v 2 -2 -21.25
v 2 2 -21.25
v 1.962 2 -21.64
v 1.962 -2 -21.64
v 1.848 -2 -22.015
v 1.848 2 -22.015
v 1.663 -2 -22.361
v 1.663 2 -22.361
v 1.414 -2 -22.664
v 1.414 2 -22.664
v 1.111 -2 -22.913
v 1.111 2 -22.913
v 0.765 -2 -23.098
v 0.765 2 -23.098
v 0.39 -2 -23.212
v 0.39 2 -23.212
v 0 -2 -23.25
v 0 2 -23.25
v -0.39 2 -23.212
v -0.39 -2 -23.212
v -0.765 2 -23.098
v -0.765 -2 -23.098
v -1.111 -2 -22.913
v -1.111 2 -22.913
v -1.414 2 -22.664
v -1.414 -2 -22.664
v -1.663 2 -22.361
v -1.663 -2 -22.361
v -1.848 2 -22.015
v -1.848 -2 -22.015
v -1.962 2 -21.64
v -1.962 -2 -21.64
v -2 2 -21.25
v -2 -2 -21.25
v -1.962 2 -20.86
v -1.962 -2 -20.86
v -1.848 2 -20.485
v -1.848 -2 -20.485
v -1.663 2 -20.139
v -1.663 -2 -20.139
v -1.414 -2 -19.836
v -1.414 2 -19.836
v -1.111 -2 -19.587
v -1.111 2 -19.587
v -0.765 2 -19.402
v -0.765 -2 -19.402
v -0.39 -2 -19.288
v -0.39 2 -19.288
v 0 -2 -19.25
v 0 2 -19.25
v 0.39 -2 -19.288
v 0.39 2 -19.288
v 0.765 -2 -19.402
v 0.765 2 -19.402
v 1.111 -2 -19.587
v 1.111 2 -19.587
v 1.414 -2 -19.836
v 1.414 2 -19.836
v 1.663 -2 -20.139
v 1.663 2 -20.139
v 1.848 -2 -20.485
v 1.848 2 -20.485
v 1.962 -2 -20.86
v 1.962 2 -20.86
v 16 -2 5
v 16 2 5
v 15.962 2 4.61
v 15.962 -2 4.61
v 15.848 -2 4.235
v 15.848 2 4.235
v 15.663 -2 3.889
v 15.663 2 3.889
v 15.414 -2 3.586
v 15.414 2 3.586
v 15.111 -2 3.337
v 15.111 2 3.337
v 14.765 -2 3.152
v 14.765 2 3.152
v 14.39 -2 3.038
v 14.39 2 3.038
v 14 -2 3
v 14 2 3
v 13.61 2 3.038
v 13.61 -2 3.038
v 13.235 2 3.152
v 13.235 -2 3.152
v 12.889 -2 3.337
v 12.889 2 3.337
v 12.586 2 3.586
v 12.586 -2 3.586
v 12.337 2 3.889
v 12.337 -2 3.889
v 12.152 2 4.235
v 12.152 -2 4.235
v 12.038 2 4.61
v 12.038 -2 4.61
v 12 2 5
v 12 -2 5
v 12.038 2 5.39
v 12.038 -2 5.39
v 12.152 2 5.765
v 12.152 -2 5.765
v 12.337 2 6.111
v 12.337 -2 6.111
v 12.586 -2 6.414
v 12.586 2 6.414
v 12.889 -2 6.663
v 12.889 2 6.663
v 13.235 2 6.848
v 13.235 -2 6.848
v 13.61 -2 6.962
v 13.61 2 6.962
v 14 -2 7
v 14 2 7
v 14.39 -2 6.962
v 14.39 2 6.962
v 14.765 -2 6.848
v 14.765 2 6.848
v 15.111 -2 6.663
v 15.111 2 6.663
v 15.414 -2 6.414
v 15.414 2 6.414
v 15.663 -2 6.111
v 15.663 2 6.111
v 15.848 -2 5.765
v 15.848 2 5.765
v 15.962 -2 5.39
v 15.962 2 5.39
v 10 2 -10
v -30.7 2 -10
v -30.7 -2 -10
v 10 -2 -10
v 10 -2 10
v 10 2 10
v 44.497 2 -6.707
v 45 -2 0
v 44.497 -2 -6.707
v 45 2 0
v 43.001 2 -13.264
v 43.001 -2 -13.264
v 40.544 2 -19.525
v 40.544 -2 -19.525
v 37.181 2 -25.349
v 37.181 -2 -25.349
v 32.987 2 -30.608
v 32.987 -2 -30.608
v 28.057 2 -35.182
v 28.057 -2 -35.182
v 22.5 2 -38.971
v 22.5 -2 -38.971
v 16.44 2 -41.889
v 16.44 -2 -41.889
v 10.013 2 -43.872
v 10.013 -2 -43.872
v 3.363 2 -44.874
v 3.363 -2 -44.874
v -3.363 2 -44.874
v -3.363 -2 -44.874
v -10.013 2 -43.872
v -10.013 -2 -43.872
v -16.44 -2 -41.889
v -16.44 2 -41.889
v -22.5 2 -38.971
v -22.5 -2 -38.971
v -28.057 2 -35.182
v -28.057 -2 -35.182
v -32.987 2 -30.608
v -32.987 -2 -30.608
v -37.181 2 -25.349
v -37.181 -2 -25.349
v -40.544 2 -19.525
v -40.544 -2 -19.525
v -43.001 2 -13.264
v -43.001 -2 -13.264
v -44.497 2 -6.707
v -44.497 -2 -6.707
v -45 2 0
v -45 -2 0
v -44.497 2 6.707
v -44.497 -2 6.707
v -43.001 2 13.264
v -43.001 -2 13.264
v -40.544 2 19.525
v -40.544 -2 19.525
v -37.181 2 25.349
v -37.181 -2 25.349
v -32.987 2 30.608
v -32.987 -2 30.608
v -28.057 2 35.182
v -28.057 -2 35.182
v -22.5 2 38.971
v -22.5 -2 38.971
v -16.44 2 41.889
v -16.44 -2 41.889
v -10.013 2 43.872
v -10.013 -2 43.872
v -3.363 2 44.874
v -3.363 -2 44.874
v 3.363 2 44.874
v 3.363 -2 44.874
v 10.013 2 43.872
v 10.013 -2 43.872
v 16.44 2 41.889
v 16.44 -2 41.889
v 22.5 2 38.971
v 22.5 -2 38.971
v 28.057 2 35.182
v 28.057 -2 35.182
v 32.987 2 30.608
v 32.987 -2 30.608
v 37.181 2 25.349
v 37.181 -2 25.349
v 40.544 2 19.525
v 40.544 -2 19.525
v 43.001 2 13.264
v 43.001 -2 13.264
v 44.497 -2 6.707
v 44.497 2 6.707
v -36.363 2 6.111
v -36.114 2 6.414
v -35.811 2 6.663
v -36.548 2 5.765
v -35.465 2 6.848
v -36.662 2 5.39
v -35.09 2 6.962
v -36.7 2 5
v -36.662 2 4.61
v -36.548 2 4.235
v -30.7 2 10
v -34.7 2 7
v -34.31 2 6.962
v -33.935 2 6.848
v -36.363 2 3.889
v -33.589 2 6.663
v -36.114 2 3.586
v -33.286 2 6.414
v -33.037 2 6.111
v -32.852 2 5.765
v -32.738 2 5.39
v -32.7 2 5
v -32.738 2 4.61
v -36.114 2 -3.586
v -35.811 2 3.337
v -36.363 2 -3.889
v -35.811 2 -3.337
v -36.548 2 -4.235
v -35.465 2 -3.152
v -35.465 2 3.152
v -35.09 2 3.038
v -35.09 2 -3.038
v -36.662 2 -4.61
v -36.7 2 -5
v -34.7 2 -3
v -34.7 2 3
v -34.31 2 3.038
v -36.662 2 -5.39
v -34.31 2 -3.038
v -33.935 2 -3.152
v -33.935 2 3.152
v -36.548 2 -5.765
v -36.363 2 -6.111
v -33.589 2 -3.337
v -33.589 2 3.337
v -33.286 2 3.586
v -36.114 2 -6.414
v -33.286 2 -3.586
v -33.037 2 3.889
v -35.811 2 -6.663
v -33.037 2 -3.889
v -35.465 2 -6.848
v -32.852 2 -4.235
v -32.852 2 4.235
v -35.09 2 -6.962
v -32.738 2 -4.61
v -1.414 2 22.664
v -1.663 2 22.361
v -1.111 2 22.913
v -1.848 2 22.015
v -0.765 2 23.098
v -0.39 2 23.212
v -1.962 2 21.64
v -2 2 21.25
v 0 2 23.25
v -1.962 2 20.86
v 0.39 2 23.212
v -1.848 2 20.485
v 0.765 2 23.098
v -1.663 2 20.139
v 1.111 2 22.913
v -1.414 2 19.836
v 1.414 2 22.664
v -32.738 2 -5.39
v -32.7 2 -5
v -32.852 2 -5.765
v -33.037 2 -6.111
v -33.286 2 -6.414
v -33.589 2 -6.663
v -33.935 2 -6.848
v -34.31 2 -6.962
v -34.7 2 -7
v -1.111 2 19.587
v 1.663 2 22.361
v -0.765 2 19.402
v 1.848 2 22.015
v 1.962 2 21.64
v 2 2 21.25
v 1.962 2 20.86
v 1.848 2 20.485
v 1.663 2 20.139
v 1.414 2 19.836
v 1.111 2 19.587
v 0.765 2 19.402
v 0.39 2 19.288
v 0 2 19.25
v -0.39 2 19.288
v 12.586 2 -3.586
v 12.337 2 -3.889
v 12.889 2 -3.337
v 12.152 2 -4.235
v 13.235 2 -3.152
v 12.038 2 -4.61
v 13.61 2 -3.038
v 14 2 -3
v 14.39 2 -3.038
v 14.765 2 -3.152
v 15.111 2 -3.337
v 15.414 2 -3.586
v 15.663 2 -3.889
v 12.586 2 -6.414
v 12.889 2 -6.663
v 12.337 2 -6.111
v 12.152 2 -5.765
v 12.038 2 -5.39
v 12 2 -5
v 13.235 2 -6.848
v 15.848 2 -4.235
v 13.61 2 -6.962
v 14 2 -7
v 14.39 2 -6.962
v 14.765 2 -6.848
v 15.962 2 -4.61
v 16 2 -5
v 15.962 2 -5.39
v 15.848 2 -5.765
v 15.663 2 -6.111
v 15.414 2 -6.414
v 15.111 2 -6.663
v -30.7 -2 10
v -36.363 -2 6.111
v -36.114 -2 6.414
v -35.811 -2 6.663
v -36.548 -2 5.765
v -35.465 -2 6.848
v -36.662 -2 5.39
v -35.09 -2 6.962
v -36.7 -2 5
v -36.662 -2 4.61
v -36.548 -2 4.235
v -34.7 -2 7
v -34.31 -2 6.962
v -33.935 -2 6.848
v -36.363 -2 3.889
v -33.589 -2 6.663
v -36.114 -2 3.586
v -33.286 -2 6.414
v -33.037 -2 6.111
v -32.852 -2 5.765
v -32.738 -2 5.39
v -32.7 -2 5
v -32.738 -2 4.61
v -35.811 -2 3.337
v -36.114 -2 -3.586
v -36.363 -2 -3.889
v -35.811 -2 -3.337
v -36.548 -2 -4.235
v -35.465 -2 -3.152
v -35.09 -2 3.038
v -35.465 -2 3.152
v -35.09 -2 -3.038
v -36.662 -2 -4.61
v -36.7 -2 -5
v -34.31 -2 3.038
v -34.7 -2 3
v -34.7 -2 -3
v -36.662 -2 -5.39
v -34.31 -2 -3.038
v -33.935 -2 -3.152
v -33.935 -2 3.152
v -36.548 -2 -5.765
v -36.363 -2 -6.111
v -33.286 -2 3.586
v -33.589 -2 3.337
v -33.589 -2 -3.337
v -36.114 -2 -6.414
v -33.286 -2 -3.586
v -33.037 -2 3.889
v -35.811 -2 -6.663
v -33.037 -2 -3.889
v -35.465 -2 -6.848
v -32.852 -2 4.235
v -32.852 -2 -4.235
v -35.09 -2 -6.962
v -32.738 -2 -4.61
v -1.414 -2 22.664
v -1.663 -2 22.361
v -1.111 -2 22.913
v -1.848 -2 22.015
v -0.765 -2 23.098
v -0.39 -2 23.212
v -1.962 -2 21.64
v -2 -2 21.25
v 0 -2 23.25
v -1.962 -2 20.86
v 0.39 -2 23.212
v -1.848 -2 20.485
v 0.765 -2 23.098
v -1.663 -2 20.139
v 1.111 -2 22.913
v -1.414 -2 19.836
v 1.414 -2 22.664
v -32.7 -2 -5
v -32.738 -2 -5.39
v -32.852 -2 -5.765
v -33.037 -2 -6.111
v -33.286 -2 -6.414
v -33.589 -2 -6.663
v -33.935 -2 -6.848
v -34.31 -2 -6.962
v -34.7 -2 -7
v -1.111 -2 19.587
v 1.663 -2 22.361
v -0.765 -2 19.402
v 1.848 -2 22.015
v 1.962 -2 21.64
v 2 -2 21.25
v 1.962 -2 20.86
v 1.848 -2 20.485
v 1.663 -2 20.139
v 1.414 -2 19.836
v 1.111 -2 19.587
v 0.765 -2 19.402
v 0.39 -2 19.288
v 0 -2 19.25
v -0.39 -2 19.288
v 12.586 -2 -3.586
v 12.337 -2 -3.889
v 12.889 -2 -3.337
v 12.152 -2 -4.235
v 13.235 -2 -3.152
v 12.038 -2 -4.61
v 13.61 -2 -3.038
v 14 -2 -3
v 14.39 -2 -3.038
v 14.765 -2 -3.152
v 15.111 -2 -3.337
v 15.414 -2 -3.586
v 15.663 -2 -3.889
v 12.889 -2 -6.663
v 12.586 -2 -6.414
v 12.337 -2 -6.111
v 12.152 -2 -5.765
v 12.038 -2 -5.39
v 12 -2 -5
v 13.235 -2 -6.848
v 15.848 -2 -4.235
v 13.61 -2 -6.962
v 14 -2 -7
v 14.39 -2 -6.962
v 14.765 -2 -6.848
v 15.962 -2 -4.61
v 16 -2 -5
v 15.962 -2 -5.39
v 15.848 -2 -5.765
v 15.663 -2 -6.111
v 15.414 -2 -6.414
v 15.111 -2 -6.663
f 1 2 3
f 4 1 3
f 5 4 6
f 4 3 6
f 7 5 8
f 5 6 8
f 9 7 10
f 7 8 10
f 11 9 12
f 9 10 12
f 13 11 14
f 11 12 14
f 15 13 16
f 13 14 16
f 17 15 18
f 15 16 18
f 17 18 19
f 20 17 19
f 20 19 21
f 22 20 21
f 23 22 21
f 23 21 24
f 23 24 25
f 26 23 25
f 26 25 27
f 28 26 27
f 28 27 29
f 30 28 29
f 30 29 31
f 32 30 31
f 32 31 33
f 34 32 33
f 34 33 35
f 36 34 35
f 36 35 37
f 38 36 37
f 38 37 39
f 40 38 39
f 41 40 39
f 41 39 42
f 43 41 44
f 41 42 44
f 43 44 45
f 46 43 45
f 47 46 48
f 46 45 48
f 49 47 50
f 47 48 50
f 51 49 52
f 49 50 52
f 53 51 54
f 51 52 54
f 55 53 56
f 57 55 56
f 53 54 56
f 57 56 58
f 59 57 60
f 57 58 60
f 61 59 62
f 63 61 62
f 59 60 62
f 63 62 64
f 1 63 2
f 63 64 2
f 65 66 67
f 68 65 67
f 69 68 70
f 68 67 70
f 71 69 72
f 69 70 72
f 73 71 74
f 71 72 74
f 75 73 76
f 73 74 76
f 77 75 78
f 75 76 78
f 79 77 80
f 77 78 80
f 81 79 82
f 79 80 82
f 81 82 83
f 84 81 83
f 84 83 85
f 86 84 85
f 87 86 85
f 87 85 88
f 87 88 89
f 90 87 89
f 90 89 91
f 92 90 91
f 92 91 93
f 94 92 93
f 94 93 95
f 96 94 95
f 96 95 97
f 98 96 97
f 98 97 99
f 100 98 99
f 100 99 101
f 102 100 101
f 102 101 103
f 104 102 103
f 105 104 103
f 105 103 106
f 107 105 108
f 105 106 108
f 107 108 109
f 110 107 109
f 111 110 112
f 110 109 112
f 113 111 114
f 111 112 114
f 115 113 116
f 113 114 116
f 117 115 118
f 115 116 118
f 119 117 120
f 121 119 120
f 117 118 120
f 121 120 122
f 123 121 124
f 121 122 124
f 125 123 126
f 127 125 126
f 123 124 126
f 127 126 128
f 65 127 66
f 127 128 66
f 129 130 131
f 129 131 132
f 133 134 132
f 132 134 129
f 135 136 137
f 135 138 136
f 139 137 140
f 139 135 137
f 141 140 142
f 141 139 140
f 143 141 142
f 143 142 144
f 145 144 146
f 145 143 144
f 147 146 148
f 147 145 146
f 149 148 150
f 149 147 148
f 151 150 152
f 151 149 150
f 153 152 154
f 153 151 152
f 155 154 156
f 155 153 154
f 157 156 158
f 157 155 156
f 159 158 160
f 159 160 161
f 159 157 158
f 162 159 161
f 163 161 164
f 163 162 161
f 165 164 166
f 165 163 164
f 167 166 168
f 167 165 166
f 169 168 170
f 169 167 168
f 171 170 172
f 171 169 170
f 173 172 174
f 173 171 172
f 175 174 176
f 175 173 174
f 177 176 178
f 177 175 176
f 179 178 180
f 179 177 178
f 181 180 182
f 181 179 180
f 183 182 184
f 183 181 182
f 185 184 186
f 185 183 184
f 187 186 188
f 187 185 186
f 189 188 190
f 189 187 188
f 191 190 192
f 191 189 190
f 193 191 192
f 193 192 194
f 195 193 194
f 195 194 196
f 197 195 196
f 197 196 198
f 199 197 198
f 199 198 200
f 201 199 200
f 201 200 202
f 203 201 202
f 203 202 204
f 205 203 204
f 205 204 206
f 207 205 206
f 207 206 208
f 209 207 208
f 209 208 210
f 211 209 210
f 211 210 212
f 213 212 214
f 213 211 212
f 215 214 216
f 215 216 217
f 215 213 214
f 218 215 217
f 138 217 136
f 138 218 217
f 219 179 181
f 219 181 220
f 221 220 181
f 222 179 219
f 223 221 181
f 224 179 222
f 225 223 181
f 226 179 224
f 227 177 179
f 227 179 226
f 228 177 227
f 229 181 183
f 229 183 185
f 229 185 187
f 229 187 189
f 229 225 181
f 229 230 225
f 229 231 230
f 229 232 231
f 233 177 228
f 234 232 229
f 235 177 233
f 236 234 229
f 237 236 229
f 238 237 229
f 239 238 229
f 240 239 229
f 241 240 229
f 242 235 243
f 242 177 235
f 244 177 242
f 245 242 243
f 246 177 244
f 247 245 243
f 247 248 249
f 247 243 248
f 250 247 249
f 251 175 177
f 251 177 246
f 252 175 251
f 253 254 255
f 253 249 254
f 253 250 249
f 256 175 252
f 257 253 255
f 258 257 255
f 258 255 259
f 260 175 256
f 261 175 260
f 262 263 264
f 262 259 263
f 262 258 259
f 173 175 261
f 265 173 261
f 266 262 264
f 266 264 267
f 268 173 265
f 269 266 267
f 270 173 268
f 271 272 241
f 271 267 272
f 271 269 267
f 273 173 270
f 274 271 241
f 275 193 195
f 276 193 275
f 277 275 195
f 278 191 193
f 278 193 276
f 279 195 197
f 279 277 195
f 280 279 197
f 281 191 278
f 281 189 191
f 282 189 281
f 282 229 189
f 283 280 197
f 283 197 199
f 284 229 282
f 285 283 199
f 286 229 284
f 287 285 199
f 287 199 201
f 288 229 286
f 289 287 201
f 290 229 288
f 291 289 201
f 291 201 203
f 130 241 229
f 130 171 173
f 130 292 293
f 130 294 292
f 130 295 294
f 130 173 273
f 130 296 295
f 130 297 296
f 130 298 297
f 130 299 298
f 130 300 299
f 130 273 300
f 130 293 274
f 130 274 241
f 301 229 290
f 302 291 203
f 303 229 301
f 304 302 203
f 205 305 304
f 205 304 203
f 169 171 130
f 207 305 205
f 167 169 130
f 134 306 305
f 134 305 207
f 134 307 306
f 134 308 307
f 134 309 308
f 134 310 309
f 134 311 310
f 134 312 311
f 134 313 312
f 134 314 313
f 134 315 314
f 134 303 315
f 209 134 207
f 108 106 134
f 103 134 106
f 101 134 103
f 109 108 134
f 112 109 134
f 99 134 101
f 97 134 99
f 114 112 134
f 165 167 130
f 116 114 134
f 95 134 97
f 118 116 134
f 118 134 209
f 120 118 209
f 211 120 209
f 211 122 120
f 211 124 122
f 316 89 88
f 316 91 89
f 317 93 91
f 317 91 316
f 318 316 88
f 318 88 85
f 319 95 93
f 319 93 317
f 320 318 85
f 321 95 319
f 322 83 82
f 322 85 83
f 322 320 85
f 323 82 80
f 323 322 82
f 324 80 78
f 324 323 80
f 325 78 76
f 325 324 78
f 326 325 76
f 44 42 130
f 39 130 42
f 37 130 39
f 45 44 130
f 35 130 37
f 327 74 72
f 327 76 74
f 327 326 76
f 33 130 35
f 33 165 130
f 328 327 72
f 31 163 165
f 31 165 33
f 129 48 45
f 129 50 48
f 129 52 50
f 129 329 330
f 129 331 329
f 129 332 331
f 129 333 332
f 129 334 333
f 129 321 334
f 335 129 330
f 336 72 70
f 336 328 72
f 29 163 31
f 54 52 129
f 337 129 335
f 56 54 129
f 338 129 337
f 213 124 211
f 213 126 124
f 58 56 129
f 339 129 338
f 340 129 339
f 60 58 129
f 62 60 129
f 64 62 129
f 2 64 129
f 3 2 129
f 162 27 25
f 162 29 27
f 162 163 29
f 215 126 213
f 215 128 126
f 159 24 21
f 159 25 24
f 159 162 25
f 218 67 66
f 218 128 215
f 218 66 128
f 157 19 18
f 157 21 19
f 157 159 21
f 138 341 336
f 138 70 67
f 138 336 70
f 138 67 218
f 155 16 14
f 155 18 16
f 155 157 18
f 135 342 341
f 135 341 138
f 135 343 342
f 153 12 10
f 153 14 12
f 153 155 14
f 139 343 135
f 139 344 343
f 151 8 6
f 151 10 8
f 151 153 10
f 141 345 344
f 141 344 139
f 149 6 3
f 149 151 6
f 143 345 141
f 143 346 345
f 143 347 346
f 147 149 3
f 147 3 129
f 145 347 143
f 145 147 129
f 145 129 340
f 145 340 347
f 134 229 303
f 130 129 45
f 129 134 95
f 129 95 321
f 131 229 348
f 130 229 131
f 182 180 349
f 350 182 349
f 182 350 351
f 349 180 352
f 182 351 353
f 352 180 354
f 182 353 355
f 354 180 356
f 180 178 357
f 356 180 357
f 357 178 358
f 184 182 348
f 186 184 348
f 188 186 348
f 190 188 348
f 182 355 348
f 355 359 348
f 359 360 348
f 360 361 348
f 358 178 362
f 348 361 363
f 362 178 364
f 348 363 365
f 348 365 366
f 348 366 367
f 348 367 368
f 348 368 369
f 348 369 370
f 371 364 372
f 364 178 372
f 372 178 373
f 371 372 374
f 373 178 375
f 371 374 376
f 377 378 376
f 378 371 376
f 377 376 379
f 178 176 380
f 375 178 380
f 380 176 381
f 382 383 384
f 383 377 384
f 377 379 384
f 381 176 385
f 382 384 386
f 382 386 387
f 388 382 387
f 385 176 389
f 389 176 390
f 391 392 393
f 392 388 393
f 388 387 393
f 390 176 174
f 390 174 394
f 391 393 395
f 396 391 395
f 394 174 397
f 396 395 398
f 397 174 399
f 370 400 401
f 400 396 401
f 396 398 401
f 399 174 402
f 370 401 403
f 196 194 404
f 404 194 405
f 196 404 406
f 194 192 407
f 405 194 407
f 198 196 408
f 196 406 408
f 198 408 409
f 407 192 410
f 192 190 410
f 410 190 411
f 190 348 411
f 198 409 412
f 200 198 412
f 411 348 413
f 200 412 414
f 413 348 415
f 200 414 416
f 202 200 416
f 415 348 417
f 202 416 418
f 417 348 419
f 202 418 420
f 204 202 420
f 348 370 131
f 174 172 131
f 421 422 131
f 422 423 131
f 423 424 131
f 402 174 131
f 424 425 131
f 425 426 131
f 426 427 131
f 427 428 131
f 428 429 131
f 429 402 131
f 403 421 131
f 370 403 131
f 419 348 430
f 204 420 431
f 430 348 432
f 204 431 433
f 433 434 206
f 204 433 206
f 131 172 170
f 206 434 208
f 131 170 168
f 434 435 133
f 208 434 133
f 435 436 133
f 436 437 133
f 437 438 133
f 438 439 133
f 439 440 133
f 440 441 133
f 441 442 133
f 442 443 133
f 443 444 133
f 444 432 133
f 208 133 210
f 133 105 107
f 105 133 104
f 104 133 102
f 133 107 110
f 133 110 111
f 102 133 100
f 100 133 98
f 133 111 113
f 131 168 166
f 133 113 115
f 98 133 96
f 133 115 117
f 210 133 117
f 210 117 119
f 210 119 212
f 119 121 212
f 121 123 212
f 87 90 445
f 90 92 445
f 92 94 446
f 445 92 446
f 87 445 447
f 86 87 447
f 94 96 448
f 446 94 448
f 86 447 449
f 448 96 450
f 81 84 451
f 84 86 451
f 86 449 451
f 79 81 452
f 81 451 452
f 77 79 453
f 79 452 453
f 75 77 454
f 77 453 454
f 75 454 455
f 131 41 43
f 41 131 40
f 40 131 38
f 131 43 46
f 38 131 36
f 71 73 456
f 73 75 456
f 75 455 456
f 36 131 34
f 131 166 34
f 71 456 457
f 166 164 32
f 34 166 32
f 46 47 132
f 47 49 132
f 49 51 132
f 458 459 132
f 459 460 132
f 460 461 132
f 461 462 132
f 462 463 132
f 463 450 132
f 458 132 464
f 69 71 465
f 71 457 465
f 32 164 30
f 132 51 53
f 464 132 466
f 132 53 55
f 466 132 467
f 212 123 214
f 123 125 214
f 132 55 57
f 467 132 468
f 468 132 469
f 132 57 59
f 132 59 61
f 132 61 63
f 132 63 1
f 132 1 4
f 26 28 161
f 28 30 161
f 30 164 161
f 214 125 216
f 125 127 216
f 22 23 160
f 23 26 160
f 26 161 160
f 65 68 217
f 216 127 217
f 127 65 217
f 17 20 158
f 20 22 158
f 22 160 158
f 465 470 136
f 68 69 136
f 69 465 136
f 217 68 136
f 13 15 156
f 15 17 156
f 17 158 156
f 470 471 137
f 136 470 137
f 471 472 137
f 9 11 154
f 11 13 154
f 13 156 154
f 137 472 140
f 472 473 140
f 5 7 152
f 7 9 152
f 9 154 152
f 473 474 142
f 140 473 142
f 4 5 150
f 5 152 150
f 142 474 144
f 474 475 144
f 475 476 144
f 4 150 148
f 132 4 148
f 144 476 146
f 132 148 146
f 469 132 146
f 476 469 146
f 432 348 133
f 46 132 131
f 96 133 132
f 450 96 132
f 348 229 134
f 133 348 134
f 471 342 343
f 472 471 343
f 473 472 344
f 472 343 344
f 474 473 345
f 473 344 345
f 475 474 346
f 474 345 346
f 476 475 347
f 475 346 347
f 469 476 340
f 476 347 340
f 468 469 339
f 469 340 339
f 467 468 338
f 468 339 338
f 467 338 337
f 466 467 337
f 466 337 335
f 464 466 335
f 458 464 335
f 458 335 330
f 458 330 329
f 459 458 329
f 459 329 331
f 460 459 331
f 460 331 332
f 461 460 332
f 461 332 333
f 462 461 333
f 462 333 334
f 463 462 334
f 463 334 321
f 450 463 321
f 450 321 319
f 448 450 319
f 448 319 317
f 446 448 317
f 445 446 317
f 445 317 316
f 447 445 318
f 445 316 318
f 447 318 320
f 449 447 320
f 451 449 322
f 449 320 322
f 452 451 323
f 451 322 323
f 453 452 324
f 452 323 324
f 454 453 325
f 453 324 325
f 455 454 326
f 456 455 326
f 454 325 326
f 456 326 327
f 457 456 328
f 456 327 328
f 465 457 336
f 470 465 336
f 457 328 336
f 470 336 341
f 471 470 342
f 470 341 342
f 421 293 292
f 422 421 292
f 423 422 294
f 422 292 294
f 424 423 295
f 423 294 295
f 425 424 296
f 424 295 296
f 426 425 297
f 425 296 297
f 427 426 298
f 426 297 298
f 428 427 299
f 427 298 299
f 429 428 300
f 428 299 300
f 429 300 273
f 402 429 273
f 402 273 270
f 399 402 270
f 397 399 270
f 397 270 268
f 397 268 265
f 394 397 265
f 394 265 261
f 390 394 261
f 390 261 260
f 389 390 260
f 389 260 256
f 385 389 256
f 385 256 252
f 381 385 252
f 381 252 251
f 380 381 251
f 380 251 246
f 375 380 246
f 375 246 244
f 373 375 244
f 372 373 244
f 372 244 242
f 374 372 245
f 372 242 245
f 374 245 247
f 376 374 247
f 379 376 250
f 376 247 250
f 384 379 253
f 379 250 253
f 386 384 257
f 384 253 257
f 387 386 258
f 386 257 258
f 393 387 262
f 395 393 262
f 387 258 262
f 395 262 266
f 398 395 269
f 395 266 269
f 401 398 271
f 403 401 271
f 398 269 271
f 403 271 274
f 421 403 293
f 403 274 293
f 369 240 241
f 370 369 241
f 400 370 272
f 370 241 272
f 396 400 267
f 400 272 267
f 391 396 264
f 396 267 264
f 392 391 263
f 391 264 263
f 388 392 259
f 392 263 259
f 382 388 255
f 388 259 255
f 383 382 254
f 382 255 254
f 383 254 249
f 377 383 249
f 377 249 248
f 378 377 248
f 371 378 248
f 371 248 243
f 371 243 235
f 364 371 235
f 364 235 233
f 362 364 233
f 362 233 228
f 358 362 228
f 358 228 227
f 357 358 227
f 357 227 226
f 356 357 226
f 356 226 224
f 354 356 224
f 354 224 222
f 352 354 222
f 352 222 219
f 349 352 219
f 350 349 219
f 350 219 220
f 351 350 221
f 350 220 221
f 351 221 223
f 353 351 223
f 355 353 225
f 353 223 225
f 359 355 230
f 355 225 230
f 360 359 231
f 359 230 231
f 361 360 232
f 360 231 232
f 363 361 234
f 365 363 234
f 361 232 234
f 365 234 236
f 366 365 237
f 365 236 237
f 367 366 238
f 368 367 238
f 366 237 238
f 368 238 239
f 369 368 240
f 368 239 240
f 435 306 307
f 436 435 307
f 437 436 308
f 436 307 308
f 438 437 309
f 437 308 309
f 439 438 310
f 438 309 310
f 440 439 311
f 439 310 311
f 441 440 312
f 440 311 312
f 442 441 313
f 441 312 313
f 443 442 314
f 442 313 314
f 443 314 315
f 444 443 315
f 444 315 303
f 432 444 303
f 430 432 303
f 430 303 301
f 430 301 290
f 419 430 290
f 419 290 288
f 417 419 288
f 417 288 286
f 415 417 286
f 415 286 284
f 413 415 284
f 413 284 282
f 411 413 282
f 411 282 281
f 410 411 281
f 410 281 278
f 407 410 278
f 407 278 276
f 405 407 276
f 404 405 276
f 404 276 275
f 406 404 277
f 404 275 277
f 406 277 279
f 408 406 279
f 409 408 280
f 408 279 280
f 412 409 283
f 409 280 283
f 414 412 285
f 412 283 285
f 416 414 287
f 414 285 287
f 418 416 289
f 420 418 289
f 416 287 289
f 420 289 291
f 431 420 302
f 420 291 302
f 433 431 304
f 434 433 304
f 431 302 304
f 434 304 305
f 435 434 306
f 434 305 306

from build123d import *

# Parameters (mm, degrees)
SCHIZZO1_R                   = 45
ESTRUSIONE_ESTRUSIONE1_DEPTH = 2
CROQUIS1_R                   = 2
CROQUIS1_W                   = 40.7
CROQUIS1_H                   = 20
CORTAR_EXTRUIR1_DEPTH        = 10


with BuildPart() as part:
    # Schizzo1 → Estrusione-Estrusione1 (new body, symmetric)
    with BuildSketch(Plane(origin=(0, 0, 0), x_dir=(1, 0, 0), z_dir=(0, 1, 0))):
        Circle(SCHIZZO1_R)
    extrude(amount=ESTRUSIONE_ESTRUSIONE1_DEPTH, both=True)

    # Croquis1 → Cortar-Extruir1 (cut)
    with BuildSketch(Plane(origin=(0, 2, 0), x_dir=(1, 0, 0), z_dir=(0, 1, 0))):
        with Locations((-34.7, 5)):
            Circle(CROQUIS1_R)
        with Locations((-34.7, -5)):
            Circle(CROQUIS1_R)
        with Locations((0, -21.25)):
            Circle(CROQUIS1_R)
        with Locations((0, 21.25)):
            Circle(CROQUIS1_R)
        with Locations((14, 5)):
            Circle(CROQUIS1_R)
        with Locations((14, -5)):
            Circle(CROQUIS1_R)
        with Locations((-10.35, 0)):
            Rectangle(CROQUIS1_W, CROQUIS1_H)
    extrude(amount=-CORTAR_EXTRUIR1_DEPTH, mode=Mode.SUBTRACT)


solid = part.part
